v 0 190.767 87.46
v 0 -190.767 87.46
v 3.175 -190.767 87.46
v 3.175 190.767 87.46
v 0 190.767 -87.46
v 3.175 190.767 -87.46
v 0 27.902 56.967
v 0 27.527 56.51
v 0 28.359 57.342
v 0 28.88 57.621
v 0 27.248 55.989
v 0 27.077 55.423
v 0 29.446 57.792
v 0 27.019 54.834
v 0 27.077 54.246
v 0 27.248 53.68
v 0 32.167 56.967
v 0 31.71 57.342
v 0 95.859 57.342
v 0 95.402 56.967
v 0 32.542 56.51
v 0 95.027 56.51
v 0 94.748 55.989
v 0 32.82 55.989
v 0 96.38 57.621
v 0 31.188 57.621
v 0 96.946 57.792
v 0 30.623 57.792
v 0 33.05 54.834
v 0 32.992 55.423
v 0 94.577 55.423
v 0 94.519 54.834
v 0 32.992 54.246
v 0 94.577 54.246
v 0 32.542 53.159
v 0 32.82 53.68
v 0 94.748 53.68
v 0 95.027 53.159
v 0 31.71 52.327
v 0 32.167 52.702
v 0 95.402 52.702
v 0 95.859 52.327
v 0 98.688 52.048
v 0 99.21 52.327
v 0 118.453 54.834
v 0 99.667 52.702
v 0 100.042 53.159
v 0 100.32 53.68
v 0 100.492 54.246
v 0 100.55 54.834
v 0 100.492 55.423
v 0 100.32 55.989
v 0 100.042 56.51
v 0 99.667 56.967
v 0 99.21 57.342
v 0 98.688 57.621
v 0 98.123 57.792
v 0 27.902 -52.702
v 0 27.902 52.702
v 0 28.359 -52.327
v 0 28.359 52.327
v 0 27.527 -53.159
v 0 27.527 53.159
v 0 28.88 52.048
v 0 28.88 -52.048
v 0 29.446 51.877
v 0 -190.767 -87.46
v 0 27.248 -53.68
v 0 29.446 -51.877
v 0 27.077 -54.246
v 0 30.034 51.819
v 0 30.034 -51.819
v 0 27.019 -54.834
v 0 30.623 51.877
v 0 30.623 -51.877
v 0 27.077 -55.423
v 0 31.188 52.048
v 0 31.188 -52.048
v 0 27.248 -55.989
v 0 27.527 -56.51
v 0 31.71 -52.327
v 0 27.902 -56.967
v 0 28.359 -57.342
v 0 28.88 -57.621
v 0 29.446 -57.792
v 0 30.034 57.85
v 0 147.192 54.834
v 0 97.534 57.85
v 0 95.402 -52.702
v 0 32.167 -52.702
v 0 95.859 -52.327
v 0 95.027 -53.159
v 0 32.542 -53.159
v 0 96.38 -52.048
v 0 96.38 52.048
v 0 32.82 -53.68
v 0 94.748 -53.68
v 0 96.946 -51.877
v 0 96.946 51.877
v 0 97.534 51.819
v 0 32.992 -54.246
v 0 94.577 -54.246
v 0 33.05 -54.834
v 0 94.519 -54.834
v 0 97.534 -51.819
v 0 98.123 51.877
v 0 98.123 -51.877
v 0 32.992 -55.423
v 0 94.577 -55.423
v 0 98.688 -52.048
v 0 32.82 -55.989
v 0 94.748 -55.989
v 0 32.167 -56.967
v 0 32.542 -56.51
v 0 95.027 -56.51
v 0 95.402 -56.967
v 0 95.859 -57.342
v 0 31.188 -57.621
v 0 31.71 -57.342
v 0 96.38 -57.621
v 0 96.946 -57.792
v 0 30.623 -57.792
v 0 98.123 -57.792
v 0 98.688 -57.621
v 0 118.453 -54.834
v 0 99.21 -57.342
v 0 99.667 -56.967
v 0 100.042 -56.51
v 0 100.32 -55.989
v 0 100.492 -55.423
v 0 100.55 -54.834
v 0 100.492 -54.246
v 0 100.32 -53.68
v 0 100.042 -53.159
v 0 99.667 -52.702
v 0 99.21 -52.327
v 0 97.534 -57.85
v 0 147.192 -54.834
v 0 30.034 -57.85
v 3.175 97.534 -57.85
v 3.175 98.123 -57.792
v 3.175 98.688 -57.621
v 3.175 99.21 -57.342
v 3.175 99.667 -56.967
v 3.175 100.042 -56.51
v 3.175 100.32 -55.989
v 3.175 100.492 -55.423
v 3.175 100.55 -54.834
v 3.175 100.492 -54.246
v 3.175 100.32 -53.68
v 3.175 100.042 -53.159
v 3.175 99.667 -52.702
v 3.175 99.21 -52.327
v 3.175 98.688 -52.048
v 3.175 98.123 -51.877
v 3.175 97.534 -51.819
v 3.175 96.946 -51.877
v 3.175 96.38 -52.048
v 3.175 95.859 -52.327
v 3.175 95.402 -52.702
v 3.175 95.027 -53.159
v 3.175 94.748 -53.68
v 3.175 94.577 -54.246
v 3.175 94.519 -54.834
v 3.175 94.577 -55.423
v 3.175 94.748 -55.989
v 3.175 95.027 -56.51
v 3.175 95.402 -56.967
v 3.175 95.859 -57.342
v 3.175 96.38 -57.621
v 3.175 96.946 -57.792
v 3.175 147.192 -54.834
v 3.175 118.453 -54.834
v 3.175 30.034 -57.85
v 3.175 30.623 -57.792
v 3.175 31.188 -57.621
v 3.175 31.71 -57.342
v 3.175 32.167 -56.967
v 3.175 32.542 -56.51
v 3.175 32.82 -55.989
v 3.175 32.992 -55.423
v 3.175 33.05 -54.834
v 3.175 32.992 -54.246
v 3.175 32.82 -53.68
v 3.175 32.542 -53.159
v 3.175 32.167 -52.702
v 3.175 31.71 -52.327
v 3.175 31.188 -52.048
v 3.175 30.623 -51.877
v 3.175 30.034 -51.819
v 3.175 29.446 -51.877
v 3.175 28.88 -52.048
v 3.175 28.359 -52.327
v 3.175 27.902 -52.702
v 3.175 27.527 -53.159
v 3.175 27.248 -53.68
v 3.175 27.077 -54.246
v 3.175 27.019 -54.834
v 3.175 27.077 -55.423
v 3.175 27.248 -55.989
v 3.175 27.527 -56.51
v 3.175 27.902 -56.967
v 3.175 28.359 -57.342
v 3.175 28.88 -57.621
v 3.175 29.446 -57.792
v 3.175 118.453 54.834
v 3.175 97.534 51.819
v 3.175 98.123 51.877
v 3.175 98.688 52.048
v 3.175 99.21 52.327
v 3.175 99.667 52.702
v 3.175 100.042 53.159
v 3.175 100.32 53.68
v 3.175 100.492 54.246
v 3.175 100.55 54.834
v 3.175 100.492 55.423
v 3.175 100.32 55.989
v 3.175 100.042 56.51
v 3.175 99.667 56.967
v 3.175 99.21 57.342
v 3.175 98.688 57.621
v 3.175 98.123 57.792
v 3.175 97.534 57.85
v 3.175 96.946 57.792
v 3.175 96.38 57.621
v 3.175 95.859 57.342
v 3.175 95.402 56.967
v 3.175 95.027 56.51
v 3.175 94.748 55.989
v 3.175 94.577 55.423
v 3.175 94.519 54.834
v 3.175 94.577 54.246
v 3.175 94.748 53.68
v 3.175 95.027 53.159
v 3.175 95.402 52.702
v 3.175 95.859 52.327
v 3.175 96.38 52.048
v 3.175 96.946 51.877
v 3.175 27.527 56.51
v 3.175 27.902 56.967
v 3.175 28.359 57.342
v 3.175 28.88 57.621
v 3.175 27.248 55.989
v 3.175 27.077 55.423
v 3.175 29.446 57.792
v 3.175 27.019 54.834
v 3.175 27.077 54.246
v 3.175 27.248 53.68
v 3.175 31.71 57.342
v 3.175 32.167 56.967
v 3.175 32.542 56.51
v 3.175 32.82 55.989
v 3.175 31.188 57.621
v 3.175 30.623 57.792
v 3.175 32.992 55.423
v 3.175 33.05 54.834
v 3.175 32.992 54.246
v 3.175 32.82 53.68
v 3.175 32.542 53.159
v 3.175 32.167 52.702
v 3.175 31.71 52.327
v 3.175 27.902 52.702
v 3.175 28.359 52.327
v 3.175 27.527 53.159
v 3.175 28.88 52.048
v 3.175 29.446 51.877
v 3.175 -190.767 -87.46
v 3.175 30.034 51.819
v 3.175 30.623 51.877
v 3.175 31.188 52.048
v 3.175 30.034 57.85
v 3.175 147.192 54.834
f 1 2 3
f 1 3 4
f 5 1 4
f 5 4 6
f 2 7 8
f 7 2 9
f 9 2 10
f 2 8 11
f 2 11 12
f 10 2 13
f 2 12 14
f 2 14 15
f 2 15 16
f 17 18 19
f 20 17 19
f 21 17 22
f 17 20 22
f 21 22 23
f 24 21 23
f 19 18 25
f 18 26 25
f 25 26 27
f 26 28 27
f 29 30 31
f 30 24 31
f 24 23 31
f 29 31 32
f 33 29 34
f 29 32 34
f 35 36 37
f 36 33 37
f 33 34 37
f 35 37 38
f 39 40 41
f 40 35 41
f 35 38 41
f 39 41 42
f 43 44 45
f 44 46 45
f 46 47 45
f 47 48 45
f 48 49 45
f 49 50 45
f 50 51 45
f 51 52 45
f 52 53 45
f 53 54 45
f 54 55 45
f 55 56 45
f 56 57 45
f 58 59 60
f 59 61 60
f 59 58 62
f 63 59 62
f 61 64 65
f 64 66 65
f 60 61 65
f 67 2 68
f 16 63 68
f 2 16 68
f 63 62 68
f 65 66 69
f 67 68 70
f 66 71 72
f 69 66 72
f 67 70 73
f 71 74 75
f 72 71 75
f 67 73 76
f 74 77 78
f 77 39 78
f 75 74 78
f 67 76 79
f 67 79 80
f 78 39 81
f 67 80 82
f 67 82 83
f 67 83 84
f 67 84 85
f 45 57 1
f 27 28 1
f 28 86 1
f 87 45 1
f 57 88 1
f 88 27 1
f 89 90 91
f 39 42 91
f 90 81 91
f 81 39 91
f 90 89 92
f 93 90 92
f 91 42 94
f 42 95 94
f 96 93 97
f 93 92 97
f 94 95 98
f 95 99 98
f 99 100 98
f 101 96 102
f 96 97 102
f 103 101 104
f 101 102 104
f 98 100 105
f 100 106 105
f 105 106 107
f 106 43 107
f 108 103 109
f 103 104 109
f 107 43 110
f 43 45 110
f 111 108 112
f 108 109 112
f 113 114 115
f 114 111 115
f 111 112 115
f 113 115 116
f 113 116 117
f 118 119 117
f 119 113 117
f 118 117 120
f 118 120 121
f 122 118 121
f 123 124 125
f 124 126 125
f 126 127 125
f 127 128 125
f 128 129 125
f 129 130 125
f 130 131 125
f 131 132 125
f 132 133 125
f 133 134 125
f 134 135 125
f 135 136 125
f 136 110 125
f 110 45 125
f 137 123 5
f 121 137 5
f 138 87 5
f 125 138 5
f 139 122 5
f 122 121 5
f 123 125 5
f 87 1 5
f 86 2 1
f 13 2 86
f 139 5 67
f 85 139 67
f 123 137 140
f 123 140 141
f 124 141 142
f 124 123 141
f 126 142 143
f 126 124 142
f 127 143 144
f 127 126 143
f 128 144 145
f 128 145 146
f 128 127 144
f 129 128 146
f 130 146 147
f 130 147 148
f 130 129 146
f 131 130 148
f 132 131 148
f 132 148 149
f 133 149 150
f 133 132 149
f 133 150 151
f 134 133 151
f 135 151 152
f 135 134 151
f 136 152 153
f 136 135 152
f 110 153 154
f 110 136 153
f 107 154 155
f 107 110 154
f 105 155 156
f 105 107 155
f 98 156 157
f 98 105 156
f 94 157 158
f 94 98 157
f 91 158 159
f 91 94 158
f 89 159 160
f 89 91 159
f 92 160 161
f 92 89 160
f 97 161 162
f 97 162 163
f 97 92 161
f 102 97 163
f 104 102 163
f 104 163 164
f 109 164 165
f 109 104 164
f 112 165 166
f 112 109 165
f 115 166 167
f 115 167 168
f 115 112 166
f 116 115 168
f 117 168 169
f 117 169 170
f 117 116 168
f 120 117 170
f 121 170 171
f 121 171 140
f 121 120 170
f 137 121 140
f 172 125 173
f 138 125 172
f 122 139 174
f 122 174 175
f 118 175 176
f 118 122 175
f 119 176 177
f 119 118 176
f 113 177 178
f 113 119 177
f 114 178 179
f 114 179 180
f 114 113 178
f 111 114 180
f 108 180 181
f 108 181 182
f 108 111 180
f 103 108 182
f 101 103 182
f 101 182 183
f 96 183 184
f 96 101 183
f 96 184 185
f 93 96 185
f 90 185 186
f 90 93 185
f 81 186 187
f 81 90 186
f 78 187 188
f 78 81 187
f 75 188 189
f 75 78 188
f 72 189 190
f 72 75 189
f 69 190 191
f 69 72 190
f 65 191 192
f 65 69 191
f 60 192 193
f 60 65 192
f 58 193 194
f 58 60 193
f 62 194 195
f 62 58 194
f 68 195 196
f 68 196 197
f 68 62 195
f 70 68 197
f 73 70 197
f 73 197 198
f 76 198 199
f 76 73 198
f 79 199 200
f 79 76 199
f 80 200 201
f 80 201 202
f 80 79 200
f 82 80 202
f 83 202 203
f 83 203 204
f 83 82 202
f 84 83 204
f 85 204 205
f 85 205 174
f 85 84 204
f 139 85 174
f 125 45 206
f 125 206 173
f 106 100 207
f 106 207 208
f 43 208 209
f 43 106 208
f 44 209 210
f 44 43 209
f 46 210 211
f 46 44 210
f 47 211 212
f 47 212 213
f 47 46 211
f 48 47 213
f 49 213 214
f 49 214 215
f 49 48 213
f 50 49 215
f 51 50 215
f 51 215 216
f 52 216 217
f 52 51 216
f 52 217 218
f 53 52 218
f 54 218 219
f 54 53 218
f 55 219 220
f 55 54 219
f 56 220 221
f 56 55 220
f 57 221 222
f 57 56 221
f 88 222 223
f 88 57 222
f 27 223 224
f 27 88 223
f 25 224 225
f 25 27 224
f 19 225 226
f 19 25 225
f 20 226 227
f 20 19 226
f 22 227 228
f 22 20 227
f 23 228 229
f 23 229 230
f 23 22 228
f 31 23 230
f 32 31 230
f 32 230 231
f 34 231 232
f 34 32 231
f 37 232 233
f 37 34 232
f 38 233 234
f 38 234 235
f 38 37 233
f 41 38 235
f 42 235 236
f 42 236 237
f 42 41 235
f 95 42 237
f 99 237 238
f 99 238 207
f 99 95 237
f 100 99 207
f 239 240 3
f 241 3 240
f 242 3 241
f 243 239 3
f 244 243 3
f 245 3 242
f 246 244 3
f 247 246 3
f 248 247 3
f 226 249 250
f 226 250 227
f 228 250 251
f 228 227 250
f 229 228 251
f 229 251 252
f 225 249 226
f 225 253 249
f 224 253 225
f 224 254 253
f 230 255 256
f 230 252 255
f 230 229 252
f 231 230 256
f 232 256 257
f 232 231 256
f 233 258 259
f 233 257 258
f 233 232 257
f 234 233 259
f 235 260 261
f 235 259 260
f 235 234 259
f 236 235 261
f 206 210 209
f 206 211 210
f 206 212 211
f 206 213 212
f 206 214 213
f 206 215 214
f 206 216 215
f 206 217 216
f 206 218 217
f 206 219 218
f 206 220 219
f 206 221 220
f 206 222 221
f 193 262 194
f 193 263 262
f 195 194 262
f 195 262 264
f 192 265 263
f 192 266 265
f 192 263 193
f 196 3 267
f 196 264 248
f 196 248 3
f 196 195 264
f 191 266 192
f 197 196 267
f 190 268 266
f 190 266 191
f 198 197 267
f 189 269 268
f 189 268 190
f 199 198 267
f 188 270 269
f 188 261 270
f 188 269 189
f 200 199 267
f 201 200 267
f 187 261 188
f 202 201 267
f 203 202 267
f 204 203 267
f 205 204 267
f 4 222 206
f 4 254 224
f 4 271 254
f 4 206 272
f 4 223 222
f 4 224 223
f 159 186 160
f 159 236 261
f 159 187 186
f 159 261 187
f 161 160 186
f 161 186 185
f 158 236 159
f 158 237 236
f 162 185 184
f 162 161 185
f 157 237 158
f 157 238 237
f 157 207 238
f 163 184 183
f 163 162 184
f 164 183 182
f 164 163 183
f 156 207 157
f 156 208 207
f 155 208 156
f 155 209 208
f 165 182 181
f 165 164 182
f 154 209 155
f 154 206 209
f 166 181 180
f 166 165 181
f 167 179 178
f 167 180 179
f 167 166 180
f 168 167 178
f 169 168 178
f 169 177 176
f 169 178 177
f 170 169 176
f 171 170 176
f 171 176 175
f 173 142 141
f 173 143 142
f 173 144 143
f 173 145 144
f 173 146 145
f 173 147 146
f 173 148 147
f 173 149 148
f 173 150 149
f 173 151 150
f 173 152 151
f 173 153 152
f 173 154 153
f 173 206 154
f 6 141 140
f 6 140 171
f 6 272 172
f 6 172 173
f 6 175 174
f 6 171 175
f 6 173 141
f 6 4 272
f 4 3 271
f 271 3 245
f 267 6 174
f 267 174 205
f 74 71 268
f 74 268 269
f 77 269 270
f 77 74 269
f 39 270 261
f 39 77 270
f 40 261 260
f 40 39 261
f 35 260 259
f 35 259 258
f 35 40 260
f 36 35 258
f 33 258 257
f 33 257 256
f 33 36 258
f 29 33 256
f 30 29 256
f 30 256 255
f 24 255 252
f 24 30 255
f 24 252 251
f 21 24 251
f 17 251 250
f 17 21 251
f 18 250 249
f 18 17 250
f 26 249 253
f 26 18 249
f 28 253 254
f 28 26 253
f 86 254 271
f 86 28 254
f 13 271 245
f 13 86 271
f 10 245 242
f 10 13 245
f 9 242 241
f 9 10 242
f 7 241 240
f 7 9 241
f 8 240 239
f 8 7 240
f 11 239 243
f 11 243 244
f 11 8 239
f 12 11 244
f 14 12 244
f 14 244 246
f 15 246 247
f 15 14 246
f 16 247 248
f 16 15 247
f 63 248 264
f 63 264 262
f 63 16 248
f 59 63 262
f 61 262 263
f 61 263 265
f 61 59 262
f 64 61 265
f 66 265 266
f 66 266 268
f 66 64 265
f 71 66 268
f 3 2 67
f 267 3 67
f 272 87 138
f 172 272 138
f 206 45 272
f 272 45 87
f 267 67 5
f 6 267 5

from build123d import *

# Parameters (mm, degrees)
SKETCH1_W           = 174.91964
SKETCH1_H           = 381.5334
SKETCH1_R           = 3.015623361
SKETCH1_W_2         = 109.668996446
SKETCH1_H_2         = 28.739233449
BOSS_EXTRUDE1_DEPTH = 3.175


with BuildPart() as part:
    # Sketch1 → Boss-Extrude1 (new body)
    with BuildSketch(Plane(origin=(0, 0, 0), x_dir=(0, 0, -1), z_dir=(1, 0, 0))):
        Rectangle(SKETCH1_W, SKETCH1_H)
        with Locations((-54.834498223, 97.534188116)):
            Circle(SKETCH1_R, mode=Mode.SUBTRACT)
        with Locations((54.834498223, 97.534188116)):
            Circle(SKETCH1_R, mode=Mode.SUBTRACT)
        with Locations((54.834498223, 30.034188116)):
            Circle(SKETCH1_R, mode=Mode.SUBTRACT)
        with Locations((-54.834498223, 30.034188116)):
            Circle(SKETCH1_R, mode=Mode.SUBTRACT)
        with Locations((0, 132.82288111)):
            Rectangle(SKETCH1_W_2, SKETCH1_H_2, mode=Mode.SUBTRACT)
    extrude(amount=BOSS_EXTRUDE1_DEPTH)


solid = part.part
